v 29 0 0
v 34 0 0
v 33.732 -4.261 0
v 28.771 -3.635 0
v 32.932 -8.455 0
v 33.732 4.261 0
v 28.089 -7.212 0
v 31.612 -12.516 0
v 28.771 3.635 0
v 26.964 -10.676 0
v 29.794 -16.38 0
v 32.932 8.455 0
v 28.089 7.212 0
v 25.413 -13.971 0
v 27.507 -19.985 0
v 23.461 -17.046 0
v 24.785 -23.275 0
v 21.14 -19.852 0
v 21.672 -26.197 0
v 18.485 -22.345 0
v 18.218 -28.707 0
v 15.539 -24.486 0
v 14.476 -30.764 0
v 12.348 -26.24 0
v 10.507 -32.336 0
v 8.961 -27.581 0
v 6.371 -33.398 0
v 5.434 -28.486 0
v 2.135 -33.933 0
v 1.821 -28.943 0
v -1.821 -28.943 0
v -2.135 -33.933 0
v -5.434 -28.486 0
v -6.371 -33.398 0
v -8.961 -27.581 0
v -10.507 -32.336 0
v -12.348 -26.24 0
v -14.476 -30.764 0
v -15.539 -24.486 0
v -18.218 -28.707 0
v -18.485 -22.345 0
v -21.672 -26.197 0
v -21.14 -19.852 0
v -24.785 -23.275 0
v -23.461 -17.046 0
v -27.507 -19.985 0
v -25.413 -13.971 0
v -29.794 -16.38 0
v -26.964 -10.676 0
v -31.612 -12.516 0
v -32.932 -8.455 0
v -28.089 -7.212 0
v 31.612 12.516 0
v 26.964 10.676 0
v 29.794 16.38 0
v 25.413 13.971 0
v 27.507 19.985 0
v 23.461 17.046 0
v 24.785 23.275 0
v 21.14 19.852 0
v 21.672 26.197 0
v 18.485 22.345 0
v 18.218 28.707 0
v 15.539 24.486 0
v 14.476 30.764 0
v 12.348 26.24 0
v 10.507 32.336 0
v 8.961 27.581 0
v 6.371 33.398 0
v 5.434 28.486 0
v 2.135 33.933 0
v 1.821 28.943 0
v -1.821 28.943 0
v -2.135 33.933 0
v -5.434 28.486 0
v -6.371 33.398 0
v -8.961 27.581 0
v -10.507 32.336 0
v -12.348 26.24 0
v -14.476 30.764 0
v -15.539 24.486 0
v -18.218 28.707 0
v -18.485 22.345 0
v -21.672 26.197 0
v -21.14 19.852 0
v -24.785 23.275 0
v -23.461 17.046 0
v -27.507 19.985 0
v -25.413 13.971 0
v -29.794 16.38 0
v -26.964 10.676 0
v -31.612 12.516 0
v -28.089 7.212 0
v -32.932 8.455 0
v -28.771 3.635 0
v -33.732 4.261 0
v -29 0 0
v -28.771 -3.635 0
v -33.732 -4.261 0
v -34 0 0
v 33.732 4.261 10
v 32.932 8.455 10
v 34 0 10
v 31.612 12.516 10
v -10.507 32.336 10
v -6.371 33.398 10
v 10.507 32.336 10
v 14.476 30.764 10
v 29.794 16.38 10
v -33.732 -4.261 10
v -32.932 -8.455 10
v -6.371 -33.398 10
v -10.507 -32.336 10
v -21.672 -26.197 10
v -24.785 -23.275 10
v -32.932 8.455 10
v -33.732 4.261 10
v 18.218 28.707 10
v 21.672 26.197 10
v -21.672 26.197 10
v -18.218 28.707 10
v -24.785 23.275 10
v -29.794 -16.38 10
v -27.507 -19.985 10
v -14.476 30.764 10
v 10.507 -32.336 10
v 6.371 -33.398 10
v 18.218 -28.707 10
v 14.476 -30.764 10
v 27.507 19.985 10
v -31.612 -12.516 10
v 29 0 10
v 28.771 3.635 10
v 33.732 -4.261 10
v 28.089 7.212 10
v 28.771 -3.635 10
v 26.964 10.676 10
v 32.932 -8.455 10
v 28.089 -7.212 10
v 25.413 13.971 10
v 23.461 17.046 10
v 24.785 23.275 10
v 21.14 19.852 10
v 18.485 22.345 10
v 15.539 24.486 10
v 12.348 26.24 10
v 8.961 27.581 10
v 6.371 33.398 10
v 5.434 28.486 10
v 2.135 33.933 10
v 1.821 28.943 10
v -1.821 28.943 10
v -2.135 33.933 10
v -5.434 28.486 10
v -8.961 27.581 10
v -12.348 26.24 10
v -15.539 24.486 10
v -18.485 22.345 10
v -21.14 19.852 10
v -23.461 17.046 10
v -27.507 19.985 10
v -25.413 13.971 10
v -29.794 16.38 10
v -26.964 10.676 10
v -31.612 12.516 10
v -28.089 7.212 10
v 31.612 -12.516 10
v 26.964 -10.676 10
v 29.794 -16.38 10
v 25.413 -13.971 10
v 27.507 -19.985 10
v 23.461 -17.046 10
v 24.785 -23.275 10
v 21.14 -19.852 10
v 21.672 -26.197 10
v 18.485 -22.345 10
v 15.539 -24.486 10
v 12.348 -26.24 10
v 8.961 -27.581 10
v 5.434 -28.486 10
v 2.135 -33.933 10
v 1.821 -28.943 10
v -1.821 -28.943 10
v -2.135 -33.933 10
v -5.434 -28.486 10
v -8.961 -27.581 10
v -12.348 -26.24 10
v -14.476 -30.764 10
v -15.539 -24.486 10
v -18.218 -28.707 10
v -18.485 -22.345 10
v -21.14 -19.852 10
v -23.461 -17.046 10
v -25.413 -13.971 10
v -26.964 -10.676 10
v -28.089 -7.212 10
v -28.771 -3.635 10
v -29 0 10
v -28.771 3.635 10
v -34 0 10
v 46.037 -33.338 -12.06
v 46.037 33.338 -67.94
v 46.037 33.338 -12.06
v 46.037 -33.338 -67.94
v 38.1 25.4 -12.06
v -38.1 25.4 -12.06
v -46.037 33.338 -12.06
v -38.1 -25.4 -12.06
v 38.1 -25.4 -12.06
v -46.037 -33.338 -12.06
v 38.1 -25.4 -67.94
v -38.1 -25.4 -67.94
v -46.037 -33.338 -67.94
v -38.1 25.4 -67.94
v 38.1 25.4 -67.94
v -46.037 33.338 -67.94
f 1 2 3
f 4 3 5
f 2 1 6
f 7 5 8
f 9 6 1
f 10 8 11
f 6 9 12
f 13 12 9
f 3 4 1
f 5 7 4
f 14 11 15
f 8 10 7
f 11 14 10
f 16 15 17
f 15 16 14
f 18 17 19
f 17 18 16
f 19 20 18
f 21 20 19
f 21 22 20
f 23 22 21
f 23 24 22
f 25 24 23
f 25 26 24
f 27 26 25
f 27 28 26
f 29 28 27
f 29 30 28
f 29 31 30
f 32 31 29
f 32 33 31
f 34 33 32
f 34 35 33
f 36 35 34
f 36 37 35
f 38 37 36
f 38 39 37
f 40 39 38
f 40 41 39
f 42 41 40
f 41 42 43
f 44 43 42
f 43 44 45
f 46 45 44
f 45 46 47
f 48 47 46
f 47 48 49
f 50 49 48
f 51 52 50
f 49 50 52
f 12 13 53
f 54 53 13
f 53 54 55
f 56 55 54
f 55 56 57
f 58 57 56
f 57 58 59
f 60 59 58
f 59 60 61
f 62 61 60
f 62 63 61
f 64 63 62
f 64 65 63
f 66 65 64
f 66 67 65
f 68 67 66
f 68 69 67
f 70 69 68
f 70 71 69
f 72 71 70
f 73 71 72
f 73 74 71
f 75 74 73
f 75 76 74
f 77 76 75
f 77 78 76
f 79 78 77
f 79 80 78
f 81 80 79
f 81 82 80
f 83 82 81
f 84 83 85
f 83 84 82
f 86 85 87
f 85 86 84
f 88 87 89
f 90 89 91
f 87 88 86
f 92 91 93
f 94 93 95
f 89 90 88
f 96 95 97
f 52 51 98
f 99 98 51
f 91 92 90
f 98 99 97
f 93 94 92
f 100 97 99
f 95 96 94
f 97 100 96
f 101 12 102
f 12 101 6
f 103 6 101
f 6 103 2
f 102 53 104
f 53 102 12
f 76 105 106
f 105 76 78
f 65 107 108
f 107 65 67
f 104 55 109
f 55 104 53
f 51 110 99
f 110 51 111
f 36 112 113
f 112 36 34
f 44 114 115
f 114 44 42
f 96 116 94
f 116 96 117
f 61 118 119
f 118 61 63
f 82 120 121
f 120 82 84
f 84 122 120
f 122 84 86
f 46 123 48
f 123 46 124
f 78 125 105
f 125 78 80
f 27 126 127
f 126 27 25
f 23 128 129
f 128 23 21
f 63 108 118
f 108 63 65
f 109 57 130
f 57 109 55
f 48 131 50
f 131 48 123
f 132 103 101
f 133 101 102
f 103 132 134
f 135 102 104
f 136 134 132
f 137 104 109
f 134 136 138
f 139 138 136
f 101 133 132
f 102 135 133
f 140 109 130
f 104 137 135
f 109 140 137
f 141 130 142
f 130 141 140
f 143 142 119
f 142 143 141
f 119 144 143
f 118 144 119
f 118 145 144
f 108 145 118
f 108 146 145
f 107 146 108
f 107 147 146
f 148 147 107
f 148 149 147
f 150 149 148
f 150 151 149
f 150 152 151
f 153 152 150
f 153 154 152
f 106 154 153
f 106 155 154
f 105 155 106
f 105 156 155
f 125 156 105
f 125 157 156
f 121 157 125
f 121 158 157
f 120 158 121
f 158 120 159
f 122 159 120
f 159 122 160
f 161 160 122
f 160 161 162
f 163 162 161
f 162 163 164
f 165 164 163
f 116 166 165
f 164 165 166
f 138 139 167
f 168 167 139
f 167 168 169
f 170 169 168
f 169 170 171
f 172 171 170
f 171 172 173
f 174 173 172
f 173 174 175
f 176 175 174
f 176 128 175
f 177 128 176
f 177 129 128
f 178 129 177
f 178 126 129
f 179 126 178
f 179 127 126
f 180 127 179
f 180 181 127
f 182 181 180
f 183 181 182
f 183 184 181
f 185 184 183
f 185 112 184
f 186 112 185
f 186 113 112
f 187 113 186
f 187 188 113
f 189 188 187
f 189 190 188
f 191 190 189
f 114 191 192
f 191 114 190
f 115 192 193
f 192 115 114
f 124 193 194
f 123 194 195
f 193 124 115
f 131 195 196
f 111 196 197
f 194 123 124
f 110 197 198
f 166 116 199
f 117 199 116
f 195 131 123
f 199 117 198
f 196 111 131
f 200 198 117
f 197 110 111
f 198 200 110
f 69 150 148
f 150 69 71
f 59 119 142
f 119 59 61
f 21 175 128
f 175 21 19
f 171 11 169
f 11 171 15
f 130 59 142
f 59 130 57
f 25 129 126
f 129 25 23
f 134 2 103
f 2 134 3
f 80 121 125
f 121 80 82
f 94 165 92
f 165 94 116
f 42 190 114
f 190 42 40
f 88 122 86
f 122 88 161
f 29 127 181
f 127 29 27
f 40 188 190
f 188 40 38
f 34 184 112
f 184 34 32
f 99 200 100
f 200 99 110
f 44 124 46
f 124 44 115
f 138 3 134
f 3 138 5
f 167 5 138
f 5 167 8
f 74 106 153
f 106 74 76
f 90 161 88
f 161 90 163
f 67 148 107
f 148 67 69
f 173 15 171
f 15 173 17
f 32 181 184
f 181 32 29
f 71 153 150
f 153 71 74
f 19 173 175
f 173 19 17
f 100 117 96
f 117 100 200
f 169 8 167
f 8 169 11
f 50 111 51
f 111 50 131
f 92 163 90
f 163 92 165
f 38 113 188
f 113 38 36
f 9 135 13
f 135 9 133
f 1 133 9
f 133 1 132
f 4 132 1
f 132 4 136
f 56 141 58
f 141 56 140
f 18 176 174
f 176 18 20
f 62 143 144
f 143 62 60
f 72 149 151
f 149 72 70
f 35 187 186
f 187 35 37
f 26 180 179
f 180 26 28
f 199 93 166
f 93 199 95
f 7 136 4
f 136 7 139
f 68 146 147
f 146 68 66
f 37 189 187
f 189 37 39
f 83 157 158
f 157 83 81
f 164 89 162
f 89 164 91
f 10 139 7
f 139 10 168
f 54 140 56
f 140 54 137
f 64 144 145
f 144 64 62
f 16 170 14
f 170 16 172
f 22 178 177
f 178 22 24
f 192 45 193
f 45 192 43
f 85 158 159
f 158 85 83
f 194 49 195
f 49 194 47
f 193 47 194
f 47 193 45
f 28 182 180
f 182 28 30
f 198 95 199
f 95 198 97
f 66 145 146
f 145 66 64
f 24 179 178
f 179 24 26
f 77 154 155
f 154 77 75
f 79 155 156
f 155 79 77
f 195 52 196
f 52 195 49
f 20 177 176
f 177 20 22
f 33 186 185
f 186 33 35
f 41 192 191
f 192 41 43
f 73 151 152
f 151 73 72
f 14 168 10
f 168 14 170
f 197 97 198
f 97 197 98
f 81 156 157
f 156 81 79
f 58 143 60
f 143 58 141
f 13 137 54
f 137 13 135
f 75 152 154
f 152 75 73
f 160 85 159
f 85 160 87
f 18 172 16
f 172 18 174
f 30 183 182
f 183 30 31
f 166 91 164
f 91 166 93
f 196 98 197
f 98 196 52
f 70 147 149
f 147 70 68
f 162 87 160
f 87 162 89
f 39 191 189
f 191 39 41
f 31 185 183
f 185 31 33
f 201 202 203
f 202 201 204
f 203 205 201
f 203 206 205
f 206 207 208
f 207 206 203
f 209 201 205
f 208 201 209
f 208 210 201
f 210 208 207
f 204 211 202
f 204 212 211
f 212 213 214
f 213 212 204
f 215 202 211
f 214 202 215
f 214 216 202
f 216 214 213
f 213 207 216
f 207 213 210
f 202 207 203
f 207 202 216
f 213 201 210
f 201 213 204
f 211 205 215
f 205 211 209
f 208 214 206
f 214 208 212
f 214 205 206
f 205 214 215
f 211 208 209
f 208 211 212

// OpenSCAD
$fn=50;

HEIGHT= 10;
OUTER_DIAMETER=68;

//hull()
{
    difference()
    {
        cylinder(h=HEIGHT, d=OUTER_DIAMETER);
        cylinder(h=HEIGHT, d=OUTER_DIAMETER-10);
    }

    CM=25.4;

    x   =  3 * CM ;      //81.61 + hans_hak; //13;
    y   =  2 * CM;      //57.24 + hans_hak; //12;16;
    z  =   2.2  * CM;   // length of box

    wall_thickness = (5/8) * CM;
    translate ([0,0, -4* HEIGHT])
    difference()
    {
        difference()
        {
            cube ([x + wall_thickness, y + wall_thickness, z], center=true);    
            cube ([x, y, z ], center=true);
              
        }
    }
}
